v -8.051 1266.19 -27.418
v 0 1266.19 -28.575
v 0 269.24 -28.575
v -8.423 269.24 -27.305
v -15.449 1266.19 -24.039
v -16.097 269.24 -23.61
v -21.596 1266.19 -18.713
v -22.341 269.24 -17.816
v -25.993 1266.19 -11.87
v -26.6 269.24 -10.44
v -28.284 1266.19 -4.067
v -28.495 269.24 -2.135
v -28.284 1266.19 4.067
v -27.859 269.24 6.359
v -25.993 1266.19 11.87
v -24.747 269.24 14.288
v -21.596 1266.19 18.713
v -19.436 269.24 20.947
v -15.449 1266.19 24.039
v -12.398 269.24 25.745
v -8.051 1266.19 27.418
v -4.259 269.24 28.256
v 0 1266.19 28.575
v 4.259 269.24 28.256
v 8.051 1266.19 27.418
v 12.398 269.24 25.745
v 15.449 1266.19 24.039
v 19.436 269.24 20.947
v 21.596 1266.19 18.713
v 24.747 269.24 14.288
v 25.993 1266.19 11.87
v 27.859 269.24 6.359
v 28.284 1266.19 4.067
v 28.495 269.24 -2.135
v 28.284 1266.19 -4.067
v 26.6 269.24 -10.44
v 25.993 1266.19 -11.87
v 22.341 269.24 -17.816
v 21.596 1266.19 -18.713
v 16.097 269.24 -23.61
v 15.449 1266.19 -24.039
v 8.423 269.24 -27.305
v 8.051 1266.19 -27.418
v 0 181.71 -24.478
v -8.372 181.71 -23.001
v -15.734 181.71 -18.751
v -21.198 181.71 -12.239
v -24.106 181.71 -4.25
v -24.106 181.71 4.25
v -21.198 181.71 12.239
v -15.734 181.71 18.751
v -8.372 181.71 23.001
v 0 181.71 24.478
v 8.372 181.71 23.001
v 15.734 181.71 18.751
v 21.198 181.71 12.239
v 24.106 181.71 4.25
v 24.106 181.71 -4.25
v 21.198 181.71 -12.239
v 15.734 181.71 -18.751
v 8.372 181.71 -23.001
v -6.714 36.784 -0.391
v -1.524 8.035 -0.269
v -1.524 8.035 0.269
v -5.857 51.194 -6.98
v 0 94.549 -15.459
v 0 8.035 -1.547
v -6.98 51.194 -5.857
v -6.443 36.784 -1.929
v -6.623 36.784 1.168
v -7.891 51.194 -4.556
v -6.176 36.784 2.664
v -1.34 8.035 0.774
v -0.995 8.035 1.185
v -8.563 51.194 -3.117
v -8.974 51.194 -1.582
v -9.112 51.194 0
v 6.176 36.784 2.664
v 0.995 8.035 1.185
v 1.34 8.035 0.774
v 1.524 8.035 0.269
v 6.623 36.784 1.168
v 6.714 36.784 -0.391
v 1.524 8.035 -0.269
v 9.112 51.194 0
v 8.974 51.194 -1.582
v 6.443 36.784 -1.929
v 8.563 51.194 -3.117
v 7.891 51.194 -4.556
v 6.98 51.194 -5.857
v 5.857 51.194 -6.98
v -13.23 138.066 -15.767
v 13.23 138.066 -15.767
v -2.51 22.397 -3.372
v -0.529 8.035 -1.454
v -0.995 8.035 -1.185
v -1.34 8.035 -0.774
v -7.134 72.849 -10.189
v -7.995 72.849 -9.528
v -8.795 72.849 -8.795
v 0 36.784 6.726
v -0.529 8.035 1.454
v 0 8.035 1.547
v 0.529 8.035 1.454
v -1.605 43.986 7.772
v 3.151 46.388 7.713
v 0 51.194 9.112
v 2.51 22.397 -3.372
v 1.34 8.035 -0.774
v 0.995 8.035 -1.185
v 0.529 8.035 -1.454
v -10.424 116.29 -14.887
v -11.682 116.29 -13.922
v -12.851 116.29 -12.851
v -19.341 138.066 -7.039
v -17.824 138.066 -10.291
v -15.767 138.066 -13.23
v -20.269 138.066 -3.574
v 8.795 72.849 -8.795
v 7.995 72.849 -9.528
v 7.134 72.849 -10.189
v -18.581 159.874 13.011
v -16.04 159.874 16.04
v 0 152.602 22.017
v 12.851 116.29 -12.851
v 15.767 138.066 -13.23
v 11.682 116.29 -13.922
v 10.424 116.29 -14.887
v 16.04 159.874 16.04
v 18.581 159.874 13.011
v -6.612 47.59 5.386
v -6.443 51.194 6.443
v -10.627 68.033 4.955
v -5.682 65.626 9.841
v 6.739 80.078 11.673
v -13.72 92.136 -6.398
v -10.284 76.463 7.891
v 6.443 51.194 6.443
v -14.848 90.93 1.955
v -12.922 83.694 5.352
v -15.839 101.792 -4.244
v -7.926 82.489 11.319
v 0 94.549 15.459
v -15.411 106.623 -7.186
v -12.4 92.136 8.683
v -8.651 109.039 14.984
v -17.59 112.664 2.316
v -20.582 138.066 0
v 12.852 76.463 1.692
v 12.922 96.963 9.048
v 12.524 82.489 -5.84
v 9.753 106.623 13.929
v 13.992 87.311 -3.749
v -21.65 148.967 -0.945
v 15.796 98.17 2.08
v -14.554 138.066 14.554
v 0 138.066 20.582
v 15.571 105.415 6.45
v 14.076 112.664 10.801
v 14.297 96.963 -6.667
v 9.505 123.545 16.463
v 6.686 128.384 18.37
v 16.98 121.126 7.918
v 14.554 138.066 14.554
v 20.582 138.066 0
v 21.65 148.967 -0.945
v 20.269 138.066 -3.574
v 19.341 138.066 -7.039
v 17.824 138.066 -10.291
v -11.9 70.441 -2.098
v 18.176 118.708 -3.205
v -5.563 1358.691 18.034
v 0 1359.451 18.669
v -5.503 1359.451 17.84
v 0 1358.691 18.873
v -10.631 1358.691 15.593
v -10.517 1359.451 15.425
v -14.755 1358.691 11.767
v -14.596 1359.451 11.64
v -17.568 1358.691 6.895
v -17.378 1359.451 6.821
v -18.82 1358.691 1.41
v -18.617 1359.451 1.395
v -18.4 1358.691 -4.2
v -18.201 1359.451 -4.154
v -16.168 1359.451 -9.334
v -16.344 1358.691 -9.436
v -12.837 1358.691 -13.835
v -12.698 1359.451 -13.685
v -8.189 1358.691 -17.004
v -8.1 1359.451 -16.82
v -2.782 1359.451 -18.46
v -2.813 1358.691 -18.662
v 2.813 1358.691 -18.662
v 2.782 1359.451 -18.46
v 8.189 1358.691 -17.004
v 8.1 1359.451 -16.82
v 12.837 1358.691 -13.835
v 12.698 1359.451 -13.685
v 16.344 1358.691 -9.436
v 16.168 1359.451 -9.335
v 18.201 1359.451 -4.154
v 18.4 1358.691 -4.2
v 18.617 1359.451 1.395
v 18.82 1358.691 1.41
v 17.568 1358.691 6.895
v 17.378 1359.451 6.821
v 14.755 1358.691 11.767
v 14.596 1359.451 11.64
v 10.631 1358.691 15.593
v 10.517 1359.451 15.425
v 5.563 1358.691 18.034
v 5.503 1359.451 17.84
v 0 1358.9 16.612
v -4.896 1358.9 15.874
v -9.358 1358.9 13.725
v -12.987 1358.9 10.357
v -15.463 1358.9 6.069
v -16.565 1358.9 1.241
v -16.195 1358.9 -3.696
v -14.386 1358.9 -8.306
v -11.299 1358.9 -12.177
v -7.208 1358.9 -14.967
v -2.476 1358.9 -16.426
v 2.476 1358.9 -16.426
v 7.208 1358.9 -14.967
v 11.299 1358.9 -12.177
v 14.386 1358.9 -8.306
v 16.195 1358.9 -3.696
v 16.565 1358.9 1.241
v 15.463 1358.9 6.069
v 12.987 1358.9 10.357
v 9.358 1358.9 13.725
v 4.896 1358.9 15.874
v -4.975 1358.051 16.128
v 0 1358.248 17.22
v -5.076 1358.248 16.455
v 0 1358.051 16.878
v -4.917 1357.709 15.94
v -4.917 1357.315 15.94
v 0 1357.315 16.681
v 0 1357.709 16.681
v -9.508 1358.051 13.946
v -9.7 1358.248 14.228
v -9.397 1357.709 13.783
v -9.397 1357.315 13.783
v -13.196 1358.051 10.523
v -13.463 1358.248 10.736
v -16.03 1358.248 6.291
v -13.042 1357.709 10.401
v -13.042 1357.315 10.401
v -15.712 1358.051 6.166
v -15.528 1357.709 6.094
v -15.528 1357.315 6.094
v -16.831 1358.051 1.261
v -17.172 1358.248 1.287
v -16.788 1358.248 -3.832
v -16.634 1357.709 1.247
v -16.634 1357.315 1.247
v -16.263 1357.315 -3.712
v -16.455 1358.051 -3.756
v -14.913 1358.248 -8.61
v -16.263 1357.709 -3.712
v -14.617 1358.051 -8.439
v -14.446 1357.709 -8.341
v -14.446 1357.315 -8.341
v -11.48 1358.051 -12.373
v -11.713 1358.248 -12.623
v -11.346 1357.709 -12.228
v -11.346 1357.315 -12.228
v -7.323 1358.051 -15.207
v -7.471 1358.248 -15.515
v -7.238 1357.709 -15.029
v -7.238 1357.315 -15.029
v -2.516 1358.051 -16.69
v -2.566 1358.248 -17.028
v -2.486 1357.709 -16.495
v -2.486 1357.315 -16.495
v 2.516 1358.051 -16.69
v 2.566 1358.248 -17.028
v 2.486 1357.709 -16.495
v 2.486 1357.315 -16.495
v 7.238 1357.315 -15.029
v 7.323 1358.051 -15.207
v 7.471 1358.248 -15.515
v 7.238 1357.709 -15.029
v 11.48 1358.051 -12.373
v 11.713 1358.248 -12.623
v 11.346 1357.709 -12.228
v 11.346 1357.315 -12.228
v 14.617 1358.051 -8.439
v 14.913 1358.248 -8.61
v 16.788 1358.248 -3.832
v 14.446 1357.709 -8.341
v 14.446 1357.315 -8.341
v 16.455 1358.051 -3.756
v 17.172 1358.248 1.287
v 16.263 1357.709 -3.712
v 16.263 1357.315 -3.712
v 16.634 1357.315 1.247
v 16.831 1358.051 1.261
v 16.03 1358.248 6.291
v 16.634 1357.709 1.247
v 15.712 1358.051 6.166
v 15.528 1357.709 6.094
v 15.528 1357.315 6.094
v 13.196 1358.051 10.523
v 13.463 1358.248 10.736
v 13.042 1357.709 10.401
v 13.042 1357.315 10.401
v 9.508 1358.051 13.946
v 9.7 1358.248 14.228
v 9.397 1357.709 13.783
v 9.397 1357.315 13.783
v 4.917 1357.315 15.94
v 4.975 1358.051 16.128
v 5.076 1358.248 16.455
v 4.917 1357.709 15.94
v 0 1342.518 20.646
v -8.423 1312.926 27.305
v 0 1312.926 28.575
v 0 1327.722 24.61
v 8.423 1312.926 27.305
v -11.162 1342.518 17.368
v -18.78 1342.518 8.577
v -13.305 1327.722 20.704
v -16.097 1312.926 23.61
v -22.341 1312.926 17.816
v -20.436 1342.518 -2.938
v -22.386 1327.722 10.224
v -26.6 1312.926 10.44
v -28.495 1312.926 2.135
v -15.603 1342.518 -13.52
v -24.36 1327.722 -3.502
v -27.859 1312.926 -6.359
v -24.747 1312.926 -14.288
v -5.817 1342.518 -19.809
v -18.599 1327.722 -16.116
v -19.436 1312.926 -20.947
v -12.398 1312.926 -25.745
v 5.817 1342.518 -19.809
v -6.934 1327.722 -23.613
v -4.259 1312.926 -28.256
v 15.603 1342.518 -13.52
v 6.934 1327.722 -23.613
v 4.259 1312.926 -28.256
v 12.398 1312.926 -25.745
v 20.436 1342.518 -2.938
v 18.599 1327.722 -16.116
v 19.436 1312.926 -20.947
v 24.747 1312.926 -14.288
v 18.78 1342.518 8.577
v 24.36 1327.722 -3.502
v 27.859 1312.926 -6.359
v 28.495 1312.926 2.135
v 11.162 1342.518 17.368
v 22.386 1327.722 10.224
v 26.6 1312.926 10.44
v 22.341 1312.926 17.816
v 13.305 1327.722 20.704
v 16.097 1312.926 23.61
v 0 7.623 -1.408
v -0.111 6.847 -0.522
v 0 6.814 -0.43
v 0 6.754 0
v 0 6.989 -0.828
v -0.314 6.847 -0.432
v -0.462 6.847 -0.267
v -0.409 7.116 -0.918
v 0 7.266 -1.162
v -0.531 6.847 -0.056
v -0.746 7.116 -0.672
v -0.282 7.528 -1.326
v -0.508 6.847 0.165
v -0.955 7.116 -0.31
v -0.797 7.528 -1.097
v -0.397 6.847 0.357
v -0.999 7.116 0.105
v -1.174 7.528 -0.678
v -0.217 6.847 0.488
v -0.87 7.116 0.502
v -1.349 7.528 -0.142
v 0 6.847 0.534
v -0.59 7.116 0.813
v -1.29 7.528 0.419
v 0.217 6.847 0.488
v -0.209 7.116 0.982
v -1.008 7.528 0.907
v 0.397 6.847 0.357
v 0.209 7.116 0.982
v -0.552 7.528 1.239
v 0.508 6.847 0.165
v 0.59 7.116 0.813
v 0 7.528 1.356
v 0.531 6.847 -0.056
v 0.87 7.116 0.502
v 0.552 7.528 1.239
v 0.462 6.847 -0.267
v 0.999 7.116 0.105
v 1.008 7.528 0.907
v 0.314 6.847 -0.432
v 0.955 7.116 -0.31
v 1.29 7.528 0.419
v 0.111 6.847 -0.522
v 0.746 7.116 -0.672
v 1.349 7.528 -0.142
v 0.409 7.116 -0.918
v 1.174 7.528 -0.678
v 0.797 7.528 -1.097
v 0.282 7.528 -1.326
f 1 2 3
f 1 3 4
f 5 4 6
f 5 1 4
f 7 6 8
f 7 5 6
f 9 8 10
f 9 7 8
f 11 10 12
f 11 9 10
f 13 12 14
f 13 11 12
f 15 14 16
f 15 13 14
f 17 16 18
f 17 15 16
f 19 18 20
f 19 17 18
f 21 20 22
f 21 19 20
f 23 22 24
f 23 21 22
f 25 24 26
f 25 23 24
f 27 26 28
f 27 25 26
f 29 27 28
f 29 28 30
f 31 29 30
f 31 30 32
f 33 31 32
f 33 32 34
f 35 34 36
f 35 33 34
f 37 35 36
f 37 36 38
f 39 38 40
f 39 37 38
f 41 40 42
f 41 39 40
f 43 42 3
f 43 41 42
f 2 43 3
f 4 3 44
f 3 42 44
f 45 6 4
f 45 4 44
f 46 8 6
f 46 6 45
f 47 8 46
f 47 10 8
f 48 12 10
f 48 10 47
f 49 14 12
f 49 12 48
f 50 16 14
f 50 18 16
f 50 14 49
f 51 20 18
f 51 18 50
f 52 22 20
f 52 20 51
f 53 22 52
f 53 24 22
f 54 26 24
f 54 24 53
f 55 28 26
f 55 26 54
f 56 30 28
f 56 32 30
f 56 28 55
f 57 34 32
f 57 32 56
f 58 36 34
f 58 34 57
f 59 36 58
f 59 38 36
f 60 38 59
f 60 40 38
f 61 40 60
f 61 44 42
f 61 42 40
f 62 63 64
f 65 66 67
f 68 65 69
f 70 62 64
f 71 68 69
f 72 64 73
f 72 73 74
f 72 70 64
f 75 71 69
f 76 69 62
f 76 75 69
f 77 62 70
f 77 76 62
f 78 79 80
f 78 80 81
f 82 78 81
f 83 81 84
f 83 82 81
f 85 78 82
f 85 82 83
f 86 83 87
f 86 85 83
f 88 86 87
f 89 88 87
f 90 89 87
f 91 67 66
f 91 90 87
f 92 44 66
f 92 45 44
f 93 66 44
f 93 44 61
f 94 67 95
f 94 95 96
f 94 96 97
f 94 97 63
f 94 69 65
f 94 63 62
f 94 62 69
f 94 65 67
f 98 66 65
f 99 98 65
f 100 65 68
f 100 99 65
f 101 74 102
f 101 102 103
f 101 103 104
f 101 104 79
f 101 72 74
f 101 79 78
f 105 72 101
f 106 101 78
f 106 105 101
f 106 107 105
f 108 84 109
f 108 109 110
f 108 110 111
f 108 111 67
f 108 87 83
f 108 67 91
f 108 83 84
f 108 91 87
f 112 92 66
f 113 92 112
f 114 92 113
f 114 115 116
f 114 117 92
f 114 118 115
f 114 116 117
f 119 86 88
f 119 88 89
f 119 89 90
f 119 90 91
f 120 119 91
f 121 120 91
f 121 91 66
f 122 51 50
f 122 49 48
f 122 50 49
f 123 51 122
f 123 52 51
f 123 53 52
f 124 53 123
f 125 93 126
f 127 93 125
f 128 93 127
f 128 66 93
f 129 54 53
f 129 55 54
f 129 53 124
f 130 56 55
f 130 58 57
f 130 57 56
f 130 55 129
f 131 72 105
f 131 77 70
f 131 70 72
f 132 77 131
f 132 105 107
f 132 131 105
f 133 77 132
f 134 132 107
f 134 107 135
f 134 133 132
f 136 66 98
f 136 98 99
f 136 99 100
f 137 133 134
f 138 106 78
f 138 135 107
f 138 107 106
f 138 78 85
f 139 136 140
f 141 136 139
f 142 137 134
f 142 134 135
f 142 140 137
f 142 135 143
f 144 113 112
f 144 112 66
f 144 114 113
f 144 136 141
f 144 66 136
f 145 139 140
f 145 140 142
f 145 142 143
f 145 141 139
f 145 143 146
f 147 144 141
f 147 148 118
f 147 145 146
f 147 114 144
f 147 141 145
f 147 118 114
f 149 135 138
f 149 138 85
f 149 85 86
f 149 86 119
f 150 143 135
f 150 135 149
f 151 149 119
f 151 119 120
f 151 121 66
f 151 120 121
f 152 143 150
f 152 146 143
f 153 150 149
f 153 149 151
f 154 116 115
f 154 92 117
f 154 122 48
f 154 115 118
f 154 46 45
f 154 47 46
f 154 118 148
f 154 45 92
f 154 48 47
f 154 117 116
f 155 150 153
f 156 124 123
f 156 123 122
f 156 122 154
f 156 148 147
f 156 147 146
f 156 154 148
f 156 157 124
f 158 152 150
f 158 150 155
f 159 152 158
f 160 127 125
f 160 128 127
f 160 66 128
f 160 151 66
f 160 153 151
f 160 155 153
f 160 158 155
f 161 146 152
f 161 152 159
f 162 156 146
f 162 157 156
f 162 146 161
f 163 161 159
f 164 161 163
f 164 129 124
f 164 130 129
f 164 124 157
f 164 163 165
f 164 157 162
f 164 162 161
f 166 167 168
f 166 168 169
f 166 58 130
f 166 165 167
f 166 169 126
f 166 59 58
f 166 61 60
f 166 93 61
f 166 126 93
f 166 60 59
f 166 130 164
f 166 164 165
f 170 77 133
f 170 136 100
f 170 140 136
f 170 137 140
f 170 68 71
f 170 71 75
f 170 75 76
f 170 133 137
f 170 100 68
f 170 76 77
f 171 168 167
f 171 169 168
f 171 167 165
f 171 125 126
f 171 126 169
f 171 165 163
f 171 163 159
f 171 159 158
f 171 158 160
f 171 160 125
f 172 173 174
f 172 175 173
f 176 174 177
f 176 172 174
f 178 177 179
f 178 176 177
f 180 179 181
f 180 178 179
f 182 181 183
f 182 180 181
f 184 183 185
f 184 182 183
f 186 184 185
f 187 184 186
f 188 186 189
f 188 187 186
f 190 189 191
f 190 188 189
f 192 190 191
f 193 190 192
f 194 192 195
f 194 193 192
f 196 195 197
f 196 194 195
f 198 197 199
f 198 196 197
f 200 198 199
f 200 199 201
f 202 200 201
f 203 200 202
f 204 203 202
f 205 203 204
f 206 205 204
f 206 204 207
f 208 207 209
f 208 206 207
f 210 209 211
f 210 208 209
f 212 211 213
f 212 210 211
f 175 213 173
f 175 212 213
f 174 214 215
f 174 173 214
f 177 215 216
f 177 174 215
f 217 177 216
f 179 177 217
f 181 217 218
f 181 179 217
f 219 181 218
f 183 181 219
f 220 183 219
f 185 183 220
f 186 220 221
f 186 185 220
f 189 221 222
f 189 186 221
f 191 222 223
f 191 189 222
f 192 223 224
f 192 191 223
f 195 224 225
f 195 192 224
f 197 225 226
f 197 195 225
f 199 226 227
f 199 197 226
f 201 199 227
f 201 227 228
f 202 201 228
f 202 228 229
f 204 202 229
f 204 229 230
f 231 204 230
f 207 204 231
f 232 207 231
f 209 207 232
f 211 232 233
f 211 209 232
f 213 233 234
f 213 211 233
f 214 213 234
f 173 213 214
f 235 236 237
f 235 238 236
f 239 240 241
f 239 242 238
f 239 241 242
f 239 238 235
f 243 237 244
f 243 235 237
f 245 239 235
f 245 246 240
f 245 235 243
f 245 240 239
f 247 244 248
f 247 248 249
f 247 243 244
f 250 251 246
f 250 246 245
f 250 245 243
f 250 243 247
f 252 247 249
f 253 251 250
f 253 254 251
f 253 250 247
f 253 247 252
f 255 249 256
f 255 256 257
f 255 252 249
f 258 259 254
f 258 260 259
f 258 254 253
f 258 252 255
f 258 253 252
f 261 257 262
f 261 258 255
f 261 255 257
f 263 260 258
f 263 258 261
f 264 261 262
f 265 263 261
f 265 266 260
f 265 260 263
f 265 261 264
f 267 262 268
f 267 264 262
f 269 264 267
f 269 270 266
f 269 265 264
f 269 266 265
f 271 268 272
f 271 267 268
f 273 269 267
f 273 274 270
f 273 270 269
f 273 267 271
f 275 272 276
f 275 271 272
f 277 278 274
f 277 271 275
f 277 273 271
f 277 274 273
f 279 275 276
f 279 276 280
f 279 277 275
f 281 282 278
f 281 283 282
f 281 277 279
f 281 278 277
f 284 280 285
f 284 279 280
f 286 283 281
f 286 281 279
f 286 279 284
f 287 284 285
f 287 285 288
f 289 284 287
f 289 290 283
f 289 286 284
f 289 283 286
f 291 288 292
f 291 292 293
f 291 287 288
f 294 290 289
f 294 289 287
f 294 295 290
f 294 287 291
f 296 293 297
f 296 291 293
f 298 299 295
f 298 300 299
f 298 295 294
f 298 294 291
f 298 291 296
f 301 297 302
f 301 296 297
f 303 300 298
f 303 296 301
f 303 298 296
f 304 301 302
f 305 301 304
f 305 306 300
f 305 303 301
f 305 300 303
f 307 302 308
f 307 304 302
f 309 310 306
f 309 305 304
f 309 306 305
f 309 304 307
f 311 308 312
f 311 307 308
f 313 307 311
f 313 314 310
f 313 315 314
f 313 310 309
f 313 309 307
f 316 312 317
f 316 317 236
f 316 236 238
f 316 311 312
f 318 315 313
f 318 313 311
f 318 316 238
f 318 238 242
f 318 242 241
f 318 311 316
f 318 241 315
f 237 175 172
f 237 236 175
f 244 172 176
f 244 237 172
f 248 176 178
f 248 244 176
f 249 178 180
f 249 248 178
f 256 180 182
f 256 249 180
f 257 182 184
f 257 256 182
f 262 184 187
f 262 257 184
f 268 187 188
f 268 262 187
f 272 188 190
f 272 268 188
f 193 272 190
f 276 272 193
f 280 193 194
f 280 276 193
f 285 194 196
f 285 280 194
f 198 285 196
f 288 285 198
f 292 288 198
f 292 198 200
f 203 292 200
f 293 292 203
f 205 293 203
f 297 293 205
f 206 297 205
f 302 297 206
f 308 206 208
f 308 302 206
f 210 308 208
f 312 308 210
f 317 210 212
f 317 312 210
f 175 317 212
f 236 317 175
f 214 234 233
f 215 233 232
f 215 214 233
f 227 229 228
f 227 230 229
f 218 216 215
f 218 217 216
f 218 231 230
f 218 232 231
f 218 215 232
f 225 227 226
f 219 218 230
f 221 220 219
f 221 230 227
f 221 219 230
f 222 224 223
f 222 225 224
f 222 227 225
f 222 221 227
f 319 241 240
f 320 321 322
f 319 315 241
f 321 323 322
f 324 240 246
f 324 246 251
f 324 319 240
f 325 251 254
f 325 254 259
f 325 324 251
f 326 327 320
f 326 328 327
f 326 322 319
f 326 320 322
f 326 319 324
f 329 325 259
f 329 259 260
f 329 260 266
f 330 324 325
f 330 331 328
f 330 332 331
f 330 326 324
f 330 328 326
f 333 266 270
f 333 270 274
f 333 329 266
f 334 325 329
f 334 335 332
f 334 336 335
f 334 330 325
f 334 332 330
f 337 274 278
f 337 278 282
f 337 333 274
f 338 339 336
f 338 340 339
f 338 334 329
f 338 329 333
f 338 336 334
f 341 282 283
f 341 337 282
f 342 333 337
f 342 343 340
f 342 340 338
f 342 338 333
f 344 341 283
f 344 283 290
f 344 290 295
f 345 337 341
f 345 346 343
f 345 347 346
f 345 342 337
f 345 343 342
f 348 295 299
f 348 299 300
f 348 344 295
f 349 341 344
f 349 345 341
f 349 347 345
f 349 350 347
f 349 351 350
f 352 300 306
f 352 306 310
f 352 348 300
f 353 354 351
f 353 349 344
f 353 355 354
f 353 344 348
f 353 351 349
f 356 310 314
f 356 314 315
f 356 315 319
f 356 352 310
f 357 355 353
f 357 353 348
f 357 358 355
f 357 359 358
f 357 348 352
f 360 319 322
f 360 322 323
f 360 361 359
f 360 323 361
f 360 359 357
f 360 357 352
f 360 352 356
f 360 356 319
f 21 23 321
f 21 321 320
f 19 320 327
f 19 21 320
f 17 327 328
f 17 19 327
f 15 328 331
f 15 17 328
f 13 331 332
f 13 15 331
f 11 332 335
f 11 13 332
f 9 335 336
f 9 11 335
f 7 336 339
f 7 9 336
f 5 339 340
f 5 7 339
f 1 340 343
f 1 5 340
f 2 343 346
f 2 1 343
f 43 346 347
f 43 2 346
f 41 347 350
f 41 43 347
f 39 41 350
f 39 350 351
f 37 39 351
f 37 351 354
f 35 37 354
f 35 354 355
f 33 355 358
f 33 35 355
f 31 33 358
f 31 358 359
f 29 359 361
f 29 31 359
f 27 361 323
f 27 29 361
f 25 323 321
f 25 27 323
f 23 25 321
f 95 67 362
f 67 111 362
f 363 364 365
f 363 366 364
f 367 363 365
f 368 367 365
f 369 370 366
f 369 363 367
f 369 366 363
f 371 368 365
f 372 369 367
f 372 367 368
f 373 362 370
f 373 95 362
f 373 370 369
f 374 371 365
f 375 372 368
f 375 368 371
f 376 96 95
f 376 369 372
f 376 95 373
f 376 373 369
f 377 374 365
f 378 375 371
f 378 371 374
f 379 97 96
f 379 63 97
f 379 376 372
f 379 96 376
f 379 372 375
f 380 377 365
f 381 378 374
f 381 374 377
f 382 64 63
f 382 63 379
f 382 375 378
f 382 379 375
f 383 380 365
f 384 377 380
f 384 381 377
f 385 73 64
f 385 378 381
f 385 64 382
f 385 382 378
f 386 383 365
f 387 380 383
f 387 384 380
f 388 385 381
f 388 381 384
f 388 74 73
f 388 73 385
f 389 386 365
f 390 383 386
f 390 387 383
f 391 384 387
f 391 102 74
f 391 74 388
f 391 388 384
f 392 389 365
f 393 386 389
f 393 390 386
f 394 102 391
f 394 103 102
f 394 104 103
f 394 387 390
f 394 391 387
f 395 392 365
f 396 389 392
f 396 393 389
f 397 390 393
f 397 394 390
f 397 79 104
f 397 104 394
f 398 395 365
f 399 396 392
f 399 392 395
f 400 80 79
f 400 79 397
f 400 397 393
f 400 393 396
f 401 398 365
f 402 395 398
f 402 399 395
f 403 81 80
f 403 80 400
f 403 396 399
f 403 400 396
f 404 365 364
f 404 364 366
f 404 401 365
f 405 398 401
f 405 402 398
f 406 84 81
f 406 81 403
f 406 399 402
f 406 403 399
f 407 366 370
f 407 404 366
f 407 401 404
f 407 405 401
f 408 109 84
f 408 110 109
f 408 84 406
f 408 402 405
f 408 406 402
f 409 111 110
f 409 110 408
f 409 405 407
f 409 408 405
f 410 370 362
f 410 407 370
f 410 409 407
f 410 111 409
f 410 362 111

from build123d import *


with BuildPart() as part:
    # Sketch2 → Revolve1 (revolve)
    with BuildSketch(Plane.XY):
        with BuildLine():
            Line((0, 1266.19), (0, 6.753760064))
            ThreePointArc((0, 6.753760064), (1.004358981, 7.115605787), (1.547169826, 8.034858568))
            ThreePointArc((1.547169826, 8.034858568), (20.581846727, 138.066176315), (28.575, 269.24))
            Line((28.575, 269.24), (28.575, 1266.19))
            Line((28.575, 1266.19), (0, 1266.19))
        make_face()
    revolve(axis=Axis((0, 0, 0), (0, 1, 0)))

    # Sketch3 → Revolve2 (revolve)
    with BuildSketch(Plane.XY):
        with BuildLine():
            Line((-28.575, 1312.926), (-28.575, 1266.19))
            Line((-28.575, 1266.19), (0, 1266.19))
            Line((0, 1266.19), (0, 1358.9))
            Line((0, 1358.9), (-16.6116, 1358.9))
            Line((-16.6116, 1358.9), (-18.669, 1359.451278669))
            Line((-18.669, 1359.451278669), (-18.872794116, 1358.690708673))
            Line((-18.872794116, 1358.690708673), (-17.219933754, 1358.247826074))
            ThreePointArc((-17.219933754, 1358.247826074), (-16.757242508, 1357.892790594), (-16.681118386, 1357.314570482))
            Line((-16.681118386, 1357.314570482), (-28.575, 1312.926))
        make_face()
    revolve(axis=Axis((0, 1358.9, 0), (0, -1, 0)))


solid = part.part
